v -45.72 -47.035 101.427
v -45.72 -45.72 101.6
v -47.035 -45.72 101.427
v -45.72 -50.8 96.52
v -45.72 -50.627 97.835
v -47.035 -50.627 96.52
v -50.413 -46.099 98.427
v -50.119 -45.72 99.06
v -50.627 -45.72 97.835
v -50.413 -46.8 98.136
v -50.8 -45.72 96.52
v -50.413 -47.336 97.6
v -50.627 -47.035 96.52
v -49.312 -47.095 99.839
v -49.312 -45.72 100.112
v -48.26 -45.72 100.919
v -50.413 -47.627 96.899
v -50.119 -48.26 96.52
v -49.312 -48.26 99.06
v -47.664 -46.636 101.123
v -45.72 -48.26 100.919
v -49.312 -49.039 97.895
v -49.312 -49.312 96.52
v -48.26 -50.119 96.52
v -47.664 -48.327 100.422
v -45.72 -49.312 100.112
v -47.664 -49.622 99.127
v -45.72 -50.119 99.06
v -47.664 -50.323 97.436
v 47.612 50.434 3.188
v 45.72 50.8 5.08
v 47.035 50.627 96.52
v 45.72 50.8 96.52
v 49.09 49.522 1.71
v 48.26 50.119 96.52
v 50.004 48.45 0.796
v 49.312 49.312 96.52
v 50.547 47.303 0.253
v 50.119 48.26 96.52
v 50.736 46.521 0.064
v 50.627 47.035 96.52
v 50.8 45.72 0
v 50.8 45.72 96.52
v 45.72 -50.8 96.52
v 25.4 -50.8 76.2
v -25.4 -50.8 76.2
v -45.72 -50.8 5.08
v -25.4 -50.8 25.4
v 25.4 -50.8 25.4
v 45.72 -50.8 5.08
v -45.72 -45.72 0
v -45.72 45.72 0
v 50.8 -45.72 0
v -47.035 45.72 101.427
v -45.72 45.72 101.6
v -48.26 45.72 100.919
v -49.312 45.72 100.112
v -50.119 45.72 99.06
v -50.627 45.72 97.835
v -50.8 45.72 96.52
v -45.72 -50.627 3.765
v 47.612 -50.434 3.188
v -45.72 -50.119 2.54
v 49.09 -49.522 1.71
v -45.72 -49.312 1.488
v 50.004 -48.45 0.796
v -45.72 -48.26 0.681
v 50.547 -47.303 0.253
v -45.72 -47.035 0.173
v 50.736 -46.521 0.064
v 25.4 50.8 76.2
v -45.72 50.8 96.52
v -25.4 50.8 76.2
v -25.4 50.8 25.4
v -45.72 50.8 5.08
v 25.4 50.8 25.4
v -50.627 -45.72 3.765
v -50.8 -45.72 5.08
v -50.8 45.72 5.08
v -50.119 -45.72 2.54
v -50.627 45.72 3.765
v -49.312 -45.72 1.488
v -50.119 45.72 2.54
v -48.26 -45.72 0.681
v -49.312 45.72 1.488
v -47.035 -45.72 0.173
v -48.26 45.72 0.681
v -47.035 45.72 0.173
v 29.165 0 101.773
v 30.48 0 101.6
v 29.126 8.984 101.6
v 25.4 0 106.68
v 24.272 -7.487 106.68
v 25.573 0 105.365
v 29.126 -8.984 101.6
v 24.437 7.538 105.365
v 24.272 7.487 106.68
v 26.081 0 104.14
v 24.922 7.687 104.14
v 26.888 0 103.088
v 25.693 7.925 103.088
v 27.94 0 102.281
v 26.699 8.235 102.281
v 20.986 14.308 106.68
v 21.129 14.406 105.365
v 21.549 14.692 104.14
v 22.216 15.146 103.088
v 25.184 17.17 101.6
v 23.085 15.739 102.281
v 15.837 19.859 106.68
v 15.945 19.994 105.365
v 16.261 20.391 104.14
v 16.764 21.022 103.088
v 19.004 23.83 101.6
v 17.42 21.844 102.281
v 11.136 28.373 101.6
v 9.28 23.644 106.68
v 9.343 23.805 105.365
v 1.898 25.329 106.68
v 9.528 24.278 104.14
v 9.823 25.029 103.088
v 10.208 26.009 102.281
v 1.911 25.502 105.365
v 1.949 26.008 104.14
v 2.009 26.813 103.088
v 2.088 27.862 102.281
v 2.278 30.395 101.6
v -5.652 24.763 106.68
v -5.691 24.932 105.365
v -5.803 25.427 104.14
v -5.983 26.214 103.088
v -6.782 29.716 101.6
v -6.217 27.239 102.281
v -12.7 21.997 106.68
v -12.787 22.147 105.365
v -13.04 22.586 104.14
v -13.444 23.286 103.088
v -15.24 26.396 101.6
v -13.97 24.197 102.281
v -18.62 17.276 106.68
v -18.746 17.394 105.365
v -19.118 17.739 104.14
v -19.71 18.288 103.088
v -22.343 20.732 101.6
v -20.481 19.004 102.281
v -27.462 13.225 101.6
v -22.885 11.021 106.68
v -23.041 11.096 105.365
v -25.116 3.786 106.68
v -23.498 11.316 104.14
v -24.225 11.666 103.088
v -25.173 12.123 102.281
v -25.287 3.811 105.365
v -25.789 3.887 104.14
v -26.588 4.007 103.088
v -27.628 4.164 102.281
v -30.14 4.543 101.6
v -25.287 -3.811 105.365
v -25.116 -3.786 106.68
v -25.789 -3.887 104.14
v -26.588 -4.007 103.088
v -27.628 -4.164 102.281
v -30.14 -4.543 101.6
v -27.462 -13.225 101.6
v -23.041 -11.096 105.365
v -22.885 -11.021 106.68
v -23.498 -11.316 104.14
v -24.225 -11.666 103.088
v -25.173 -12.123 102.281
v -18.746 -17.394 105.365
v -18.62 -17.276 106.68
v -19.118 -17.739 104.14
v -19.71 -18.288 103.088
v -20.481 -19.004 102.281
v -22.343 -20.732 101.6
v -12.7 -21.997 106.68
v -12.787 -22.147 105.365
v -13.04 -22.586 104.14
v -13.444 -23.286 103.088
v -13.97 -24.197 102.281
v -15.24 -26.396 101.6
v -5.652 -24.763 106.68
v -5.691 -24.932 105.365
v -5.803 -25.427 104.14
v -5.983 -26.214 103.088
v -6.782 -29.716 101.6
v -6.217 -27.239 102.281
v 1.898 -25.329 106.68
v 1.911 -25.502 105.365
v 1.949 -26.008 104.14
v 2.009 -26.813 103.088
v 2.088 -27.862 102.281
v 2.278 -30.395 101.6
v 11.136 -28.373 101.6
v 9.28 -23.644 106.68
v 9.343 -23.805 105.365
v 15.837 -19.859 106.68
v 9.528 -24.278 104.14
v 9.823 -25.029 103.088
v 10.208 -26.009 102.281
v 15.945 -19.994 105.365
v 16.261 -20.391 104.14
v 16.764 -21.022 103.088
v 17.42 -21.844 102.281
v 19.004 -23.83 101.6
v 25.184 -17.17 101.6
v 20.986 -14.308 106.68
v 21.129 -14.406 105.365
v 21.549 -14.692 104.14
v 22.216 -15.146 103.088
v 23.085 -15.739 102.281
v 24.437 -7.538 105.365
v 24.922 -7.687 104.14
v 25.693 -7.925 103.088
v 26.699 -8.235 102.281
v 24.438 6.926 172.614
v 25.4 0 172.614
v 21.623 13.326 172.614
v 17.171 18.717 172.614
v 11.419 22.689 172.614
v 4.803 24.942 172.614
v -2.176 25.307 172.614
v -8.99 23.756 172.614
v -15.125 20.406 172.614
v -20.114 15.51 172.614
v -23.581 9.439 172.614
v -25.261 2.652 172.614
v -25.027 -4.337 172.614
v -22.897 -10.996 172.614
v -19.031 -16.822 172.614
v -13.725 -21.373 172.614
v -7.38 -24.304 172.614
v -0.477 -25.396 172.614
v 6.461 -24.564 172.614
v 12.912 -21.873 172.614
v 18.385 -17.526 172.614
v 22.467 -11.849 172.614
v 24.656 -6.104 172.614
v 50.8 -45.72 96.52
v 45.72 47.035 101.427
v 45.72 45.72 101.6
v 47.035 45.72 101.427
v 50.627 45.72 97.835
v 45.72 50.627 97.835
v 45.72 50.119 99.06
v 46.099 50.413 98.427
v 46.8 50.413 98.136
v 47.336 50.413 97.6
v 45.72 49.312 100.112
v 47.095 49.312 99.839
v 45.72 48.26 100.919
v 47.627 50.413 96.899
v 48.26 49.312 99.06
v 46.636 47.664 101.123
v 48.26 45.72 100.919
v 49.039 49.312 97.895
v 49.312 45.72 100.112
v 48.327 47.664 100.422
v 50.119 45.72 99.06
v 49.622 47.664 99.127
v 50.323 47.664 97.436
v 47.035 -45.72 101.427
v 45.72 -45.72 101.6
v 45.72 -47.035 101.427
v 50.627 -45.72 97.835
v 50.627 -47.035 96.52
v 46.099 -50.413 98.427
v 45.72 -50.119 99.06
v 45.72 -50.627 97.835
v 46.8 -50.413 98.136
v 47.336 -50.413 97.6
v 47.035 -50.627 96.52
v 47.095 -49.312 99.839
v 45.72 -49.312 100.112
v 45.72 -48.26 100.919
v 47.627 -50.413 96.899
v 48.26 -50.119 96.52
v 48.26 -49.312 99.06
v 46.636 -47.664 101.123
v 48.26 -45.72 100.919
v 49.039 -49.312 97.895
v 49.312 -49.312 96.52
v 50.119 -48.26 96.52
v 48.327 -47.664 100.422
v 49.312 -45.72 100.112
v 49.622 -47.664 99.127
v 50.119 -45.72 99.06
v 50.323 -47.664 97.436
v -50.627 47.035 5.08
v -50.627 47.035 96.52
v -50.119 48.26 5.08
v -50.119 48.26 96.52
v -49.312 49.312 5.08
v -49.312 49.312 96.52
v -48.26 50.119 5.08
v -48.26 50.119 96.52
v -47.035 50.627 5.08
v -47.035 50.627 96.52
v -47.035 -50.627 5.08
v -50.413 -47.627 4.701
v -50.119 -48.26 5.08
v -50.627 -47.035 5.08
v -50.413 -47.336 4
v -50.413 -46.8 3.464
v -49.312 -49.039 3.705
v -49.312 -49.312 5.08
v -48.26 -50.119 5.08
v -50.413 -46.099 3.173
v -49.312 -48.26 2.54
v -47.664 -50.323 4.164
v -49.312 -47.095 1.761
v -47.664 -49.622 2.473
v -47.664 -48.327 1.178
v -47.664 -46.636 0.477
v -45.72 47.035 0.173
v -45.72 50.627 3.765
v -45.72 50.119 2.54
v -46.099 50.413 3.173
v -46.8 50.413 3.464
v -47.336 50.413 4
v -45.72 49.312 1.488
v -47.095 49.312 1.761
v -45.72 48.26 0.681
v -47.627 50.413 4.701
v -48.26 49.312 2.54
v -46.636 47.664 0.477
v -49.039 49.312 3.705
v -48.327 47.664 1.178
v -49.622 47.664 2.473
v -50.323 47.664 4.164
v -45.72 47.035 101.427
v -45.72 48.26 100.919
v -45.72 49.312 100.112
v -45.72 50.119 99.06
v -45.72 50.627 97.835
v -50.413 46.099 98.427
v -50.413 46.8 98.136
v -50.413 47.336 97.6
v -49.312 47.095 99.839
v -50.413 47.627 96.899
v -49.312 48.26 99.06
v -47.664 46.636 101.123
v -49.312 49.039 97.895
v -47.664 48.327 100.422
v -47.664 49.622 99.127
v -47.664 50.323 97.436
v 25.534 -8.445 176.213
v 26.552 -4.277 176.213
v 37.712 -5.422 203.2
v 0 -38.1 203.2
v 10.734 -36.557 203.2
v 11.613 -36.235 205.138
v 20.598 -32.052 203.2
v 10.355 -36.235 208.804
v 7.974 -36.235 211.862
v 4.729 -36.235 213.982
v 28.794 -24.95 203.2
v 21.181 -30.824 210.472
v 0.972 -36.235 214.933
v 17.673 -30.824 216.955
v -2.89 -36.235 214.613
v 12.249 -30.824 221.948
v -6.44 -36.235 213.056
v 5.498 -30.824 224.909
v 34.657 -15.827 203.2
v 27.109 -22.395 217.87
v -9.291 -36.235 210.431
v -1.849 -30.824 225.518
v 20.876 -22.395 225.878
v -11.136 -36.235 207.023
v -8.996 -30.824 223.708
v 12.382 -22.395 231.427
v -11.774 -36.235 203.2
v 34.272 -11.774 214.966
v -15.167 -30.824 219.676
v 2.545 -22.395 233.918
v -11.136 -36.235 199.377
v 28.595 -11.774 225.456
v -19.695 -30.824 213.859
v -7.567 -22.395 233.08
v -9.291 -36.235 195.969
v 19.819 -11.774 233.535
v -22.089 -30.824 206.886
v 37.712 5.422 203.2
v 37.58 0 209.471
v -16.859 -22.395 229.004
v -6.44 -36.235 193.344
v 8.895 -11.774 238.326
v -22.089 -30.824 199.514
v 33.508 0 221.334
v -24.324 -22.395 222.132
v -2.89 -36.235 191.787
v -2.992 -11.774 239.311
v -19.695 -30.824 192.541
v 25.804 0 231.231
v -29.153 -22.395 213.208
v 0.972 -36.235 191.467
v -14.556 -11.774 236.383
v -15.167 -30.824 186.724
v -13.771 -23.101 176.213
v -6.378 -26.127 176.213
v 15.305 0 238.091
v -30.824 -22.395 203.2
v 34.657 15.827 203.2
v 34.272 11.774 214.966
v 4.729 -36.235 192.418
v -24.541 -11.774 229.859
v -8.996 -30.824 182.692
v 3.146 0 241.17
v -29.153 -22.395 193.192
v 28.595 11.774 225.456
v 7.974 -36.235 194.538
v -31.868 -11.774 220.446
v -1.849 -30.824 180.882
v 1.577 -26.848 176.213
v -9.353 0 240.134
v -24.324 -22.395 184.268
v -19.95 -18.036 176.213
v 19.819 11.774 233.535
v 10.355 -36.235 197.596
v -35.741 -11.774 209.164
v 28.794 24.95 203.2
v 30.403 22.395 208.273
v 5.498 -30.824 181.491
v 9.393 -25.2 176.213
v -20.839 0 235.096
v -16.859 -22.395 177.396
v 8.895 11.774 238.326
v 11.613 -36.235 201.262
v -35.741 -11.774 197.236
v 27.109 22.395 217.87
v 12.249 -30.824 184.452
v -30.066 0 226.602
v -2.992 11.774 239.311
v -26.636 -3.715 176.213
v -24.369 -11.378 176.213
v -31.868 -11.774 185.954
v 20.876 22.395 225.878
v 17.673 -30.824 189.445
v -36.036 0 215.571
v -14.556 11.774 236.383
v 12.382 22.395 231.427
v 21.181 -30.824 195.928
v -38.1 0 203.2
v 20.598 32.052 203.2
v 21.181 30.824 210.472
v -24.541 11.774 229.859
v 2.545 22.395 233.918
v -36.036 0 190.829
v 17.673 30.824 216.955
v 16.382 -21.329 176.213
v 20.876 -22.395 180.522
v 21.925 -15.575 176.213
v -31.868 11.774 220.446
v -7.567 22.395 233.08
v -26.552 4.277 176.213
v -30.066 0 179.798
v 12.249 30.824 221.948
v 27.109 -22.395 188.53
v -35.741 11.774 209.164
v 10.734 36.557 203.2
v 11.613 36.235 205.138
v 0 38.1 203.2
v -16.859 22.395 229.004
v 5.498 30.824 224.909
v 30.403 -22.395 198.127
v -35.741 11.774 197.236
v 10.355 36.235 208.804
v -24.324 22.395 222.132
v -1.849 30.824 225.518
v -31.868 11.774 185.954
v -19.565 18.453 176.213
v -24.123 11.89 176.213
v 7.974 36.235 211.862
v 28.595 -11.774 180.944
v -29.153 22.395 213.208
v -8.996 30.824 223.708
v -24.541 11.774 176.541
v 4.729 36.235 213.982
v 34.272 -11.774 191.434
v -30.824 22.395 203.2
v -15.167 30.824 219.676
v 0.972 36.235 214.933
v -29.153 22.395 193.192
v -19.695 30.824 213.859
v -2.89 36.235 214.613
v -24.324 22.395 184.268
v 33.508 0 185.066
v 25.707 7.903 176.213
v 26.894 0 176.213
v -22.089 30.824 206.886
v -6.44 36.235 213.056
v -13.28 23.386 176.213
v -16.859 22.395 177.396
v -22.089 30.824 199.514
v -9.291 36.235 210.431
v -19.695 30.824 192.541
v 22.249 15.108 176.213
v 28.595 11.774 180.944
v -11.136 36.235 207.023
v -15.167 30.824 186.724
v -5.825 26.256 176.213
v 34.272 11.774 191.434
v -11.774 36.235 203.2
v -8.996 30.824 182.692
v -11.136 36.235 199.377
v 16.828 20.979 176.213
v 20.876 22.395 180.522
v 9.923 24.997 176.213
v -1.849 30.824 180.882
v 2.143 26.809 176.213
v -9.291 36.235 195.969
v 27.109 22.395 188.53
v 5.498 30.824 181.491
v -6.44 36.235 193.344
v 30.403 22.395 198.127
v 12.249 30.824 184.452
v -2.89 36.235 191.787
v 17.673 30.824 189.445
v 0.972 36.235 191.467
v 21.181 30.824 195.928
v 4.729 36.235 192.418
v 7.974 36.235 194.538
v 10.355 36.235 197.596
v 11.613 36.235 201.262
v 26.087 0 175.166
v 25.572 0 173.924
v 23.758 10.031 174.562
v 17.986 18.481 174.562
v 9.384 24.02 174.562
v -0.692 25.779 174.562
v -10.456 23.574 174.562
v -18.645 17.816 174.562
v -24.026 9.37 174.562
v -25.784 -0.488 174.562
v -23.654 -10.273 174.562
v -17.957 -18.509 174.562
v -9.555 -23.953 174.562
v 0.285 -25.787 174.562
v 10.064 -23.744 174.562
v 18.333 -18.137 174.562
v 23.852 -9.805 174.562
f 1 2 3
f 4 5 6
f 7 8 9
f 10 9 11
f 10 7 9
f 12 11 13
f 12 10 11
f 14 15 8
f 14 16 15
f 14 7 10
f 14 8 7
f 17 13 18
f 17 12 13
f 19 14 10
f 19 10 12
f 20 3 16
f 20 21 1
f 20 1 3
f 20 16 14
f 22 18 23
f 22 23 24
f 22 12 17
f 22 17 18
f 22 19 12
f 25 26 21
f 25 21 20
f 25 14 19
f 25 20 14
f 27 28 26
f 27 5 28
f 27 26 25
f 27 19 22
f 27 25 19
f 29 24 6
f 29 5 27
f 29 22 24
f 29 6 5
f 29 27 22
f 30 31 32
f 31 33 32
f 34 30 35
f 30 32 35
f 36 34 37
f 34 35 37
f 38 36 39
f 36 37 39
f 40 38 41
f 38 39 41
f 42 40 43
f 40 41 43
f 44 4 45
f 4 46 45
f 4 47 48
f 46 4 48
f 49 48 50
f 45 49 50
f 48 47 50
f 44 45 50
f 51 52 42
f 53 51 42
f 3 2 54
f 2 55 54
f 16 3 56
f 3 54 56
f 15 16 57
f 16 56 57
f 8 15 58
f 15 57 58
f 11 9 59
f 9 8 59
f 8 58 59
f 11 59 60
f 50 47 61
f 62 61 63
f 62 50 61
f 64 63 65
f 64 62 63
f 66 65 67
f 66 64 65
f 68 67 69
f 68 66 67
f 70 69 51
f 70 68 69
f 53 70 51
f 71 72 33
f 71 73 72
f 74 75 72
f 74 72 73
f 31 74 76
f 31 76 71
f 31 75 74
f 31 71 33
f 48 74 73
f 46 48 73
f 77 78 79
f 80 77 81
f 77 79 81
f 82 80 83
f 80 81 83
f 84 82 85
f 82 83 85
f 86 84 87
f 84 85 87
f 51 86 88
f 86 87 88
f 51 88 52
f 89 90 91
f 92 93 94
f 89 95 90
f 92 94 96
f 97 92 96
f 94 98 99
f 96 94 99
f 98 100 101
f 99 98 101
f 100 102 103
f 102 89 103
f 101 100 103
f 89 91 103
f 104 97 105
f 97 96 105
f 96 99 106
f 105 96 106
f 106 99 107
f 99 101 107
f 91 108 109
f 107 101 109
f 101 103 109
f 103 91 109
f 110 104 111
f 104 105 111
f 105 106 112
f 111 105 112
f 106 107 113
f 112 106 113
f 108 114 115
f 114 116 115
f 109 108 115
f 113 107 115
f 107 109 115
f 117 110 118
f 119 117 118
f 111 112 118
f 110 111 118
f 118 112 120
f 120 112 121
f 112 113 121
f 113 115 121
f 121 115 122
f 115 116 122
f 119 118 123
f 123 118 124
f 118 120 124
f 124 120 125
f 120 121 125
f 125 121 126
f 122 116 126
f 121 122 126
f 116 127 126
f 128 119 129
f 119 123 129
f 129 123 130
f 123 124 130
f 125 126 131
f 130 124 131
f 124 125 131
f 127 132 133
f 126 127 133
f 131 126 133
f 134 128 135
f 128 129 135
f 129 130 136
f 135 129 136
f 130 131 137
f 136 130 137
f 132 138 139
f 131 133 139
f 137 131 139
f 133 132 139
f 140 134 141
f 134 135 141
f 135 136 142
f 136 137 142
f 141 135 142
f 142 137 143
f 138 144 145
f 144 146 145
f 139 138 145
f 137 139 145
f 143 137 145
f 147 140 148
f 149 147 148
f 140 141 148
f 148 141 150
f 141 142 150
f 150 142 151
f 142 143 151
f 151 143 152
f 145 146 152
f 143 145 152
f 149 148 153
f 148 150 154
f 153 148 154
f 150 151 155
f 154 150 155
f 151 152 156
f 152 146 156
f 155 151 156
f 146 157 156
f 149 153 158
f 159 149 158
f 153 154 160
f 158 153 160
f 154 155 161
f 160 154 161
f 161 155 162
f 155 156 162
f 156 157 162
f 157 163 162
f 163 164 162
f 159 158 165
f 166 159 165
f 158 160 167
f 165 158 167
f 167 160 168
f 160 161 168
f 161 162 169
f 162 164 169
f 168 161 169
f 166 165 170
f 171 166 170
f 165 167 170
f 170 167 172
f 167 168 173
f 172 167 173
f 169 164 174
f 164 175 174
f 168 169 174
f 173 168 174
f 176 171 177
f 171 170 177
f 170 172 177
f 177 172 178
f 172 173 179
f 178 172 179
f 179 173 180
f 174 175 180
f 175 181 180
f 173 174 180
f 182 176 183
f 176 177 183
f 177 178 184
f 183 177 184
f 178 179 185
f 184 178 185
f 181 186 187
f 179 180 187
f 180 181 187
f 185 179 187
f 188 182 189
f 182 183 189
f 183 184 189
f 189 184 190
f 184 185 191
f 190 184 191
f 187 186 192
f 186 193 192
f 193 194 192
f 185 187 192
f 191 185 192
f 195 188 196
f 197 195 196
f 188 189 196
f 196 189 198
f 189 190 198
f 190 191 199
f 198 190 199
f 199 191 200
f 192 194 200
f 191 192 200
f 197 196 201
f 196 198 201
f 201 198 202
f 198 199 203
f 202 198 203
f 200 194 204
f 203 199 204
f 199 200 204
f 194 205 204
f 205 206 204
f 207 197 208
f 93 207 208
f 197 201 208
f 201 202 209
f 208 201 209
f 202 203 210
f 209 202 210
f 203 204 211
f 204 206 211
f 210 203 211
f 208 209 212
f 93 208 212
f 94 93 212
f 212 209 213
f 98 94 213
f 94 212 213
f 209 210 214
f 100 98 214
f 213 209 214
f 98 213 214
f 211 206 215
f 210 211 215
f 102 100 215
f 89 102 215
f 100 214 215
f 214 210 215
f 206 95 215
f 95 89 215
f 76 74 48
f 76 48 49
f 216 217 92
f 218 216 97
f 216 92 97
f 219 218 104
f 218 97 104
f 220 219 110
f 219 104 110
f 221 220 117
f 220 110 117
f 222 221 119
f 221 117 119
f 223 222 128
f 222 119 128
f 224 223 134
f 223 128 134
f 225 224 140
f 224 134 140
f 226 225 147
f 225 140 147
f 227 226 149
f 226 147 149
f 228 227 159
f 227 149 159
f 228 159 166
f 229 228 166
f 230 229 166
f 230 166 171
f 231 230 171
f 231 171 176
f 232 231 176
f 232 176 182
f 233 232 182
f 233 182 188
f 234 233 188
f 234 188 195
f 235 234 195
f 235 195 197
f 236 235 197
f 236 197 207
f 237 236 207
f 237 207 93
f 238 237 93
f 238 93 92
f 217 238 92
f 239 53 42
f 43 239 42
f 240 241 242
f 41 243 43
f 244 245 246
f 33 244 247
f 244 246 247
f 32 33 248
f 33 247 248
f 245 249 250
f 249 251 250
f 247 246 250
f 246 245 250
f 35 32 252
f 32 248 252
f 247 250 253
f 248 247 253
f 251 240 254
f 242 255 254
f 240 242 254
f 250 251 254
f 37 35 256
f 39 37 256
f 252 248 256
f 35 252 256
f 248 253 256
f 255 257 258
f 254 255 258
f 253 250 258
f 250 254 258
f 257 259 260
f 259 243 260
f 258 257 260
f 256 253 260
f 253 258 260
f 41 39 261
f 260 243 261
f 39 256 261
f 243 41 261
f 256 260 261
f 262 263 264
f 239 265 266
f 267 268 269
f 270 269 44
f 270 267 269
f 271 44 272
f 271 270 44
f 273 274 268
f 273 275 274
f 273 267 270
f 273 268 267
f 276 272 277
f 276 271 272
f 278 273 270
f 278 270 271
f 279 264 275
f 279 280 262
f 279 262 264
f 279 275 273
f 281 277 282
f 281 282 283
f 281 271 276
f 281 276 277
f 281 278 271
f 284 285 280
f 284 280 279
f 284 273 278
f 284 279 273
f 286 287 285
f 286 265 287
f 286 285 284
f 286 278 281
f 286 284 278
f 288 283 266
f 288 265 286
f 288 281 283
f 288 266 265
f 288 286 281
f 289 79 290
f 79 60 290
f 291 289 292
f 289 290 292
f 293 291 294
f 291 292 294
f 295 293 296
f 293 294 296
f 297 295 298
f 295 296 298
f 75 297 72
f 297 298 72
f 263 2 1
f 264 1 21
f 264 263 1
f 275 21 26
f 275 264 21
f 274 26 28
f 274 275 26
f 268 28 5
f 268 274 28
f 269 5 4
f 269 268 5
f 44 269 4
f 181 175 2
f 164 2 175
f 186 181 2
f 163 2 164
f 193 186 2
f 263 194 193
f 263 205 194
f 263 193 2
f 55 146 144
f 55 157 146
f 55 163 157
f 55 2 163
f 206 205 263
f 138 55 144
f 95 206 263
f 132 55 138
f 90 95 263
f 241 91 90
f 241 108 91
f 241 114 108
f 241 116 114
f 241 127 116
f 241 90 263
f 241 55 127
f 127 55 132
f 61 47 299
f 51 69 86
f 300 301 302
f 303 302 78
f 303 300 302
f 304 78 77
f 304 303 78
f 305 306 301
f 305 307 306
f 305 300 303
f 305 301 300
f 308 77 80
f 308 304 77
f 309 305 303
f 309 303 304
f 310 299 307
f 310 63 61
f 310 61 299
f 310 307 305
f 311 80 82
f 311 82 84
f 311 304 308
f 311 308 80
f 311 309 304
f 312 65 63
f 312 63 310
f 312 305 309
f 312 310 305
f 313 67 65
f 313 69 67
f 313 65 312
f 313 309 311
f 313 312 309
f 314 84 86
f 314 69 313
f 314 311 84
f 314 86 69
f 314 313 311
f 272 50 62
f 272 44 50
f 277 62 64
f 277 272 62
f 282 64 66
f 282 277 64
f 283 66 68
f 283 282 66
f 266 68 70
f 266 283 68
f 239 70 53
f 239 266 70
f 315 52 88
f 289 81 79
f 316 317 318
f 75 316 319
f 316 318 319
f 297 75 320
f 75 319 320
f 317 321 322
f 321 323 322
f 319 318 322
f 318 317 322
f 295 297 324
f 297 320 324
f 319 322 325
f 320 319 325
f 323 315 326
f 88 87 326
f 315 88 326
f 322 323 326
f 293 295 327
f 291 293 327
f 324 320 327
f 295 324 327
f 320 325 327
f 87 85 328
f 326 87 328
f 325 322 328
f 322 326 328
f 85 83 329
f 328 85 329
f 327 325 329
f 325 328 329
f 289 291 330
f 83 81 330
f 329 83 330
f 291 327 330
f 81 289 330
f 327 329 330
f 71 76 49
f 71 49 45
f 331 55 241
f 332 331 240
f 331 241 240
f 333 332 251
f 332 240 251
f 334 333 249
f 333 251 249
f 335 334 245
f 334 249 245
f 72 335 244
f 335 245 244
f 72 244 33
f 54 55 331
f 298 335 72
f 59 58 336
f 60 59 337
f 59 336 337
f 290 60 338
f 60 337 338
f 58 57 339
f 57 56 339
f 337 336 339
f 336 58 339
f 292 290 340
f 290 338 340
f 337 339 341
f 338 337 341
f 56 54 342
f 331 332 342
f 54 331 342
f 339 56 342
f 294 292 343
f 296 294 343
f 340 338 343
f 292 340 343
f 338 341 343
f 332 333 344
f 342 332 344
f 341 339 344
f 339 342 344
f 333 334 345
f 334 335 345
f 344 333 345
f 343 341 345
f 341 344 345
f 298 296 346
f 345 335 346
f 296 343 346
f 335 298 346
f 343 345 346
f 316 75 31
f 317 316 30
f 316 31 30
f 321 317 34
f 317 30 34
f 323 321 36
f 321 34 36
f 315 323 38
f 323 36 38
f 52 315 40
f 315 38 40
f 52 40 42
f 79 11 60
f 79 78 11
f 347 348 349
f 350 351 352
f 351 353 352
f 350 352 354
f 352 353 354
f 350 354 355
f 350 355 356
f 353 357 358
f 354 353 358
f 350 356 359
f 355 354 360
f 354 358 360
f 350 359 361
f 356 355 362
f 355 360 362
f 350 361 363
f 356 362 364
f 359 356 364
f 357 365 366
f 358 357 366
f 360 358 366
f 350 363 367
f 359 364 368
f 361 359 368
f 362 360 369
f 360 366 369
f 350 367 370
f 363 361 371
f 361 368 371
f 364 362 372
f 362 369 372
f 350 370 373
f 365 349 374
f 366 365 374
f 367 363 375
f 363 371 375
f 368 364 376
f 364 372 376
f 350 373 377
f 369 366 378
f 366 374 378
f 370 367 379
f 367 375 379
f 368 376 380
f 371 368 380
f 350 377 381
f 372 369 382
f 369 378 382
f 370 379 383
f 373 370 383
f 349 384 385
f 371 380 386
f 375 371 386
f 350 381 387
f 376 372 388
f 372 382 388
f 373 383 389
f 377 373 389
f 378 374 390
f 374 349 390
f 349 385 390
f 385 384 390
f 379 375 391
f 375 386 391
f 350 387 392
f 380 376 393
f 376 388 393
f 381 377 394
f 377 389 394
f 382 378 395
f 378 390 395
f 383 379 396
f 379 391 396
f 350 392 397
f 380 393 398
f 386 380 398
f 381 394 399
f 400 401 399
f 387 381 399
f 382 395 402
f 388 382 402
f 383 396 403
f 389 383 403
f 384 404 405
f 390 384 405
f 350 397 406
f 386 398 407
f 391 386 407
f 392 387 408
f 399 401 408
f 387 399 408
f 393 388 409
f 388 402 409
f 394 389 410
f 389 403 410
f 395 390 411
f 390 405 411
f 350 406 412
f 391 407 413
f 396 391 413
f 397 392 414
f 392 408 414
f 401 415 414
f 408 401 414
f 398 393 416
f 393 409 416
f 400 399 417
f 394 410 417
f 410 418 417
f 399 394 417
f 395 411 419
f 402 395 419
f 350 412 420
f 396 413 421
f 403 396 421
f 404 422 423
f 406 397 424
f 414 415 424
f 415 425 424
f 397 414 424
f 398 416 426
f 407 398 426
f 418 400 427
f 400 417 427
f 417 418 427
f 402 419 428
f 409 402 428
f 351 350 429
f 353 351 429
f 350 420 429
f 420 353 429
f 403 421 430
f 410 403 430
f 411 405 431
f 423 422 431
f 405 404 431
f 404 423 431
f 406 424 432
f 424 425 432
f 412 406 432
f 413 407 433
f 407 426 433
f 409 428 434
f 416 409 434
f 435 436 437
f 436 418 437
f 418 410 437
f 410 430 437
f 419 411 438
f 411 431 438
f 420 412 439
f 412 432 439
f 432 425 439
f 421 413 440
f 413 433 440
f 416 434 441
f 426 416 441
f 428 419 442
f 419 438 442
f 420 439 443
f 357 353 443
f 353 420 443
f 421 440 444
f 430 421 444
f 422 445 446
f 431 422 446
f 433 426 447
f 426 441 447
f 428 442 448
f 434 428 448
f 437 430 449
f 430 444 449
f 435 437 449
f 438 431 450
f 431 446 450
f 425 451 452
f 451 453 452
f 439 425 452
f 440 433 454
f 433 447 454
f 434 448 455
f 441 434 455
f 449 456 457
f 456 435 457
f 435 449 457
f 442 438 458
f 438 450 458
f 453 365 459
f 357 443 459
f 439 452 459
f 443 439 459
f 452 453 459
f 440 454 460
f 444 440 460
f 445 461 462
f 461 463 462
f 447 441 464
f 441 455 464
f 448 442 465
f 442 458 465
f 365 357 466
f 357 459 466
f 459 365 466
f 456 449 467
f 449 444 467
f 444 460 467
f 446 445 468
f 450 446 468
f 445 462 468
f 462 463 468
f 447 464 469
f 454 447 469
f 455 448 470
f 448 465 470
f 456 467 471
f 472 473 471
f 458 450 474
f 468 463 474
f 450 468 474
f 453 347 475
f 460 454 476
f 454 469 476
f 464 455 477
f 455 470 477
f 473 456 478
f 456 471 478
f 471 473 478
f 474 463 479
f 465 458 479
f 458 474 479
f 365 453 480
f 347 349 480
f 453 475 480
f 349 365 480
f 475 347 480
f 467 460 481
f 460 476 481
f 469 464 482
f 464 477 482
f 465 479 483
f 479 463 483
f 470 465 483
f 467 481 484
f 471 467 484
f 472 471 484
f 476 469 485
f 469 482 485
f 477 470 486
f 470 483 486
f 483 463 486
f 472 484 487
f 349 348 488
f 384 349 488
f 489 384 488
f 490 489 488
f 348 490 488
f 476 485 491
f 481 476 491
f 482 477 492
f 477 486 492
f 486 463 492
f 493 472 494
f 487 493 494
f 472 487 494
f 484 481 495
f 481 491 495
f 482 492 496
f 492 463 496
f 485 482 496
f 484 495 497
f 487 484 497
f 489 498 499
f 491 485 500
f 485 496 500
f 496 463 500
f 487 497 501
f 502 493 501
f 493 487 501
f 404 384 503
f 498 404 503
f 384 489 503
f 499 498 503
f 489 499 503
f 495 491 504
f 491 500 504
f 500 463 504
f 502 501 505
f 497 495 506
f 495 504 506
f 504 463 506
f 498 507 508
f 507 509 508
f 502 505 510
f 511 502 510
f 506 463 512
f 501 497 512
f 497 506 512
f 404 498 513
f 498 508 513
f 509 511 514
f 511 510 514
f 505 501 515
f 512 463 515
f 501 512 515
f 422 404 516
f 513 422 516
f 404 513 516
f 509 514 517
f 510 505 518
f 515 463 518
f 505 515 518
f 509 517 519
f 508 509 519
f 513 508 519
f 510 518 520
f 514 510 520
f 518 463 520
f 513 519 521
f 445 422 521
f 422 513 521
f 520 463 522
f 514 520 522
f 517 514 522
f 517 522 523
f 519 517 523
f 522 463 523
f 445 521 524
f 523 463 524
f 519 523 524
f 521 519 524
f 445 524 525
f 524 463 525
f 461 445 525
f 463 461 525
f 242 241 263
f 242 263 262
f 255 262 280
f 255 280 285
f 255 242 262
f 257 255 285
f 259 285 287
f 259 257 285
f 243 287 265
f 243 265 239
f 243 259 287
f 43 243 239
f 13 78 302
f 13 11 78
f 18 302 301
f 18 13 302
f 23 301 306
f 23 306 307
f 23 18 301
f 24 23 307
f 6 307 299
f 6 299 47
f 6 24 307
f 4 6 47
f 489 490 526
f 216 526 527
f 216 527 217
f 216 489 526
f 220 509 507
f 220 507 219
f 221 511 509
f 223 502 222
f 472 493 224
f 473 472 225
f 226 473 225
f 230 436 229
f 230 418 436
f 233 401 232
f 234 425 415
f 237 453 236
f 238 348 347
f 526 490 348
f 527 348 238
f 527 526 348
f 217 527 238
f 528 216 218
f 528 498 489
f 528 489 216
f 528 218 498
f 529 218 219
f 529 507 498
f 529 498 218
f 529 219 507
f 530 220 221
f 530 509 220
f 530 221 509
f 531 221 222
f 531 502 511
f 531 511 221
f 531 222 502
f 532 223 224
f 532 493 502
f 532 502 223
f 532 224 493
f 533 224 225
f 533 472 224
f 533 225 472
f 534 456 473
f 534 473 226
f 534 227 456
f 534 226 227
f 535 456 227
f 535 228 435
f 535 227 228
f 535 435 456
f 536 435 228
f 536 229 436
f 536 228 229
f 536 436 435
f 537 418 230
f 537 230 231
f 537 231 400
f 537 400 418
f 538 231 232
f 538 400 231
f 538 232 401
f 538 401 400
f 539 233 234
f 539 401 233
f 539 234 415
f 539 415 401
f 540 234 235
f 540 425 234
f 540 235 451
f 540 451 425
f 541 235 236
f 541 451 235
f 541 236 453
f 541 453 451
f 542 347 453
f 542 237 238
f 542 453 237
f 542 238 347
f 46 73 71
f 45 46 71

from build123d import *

# Parameters (mm, degrees)
F0_W     = 101.6
F0_H     = 101.6
F1_DEPTH = 101.6
F2_R     = 25.4
F3_DEPTH = 101.6
F6_W     = 50.8
F6_H     = 50.8
F7_DEPTH = 101.6
F8_R     = 5.08


with BuildPart() as f1:
    # F0 (on Top) → F1 (new body)
    with BuildSketch(Plane.XY):
        Rectangle(F0_W, F0_H)
    extrude(amount=F1_DEPTH)

    # F2 (on face) → F3 (join)
    with BuildSketch(Plane.XY.offset(101.6)):
        Circle(F2_R)
    extrude(amount=F3_DEPTH)

    # F4 (on face) → F5 (revolve)
    with BuildSketch(Plane.XY.offset(203.2)):
        with BuildLine():
            Line((0, -25.4), (0, -38.1))
            ThreePointArc((0, -38.1), (38.1, 0), (0, 38.1))
            Line((0, 38.1), (0, 25.4))
            ThreePointArc((0, 25.4), (17.9605122421, 17.9605122421), (25.4, 0))
            ThreePointArc((25.4, 0), (17.9605122421, -17.9605122421), (0, -25.4))
        make_face()
        with BuildLine():
            Line((0, 25.4), (0, -25.4))
            ThreePointArc((0, -25.4), (17.9605122421, -17.9605122421), (25.4, 0))
            ThreePointArc((25.4, 0), (17.9605122421, 17.9605122421), (0, 25.4))
        make_face()
    revolve(axis=Axis((0, 0, 203.2), (0, -1, 0)))

    # F6 (on face) → F7 (cut)
    with BuildSketch(Plane.XZ.offset(50.8)):
        with Locations((0, 50.8)):
            Rectangle(F6_W, F6_H)
    extrude(amount=-F7_DEPTH, mode=Mode.SUBTRACT)

    # F8
    f8_edges = [f1.edges().sort_by_distance(p)[0] for p in [
        (50.8, 0, 101.6),
        (0, 50.8, 101.6),
        (0, -50.8, 101.6),
        (-50.8, 0, 101.6),
        (50.8, -50.8, 50.8),
        (50.8, 50.8, 50.8),
        (0, -50.8, 0),
        (-50.8, -50.8, 50.8),
        (-50.8, 0, 0),
        (0, 50.8, 0),
        (-50.8, 50.8, 50.8),
        (-25.4, 0, 101.6),
        (-25.4, 0, 174.801937),
    ]]
    fillet(f8_edges, radius=F8_R)


solid = f1.part
